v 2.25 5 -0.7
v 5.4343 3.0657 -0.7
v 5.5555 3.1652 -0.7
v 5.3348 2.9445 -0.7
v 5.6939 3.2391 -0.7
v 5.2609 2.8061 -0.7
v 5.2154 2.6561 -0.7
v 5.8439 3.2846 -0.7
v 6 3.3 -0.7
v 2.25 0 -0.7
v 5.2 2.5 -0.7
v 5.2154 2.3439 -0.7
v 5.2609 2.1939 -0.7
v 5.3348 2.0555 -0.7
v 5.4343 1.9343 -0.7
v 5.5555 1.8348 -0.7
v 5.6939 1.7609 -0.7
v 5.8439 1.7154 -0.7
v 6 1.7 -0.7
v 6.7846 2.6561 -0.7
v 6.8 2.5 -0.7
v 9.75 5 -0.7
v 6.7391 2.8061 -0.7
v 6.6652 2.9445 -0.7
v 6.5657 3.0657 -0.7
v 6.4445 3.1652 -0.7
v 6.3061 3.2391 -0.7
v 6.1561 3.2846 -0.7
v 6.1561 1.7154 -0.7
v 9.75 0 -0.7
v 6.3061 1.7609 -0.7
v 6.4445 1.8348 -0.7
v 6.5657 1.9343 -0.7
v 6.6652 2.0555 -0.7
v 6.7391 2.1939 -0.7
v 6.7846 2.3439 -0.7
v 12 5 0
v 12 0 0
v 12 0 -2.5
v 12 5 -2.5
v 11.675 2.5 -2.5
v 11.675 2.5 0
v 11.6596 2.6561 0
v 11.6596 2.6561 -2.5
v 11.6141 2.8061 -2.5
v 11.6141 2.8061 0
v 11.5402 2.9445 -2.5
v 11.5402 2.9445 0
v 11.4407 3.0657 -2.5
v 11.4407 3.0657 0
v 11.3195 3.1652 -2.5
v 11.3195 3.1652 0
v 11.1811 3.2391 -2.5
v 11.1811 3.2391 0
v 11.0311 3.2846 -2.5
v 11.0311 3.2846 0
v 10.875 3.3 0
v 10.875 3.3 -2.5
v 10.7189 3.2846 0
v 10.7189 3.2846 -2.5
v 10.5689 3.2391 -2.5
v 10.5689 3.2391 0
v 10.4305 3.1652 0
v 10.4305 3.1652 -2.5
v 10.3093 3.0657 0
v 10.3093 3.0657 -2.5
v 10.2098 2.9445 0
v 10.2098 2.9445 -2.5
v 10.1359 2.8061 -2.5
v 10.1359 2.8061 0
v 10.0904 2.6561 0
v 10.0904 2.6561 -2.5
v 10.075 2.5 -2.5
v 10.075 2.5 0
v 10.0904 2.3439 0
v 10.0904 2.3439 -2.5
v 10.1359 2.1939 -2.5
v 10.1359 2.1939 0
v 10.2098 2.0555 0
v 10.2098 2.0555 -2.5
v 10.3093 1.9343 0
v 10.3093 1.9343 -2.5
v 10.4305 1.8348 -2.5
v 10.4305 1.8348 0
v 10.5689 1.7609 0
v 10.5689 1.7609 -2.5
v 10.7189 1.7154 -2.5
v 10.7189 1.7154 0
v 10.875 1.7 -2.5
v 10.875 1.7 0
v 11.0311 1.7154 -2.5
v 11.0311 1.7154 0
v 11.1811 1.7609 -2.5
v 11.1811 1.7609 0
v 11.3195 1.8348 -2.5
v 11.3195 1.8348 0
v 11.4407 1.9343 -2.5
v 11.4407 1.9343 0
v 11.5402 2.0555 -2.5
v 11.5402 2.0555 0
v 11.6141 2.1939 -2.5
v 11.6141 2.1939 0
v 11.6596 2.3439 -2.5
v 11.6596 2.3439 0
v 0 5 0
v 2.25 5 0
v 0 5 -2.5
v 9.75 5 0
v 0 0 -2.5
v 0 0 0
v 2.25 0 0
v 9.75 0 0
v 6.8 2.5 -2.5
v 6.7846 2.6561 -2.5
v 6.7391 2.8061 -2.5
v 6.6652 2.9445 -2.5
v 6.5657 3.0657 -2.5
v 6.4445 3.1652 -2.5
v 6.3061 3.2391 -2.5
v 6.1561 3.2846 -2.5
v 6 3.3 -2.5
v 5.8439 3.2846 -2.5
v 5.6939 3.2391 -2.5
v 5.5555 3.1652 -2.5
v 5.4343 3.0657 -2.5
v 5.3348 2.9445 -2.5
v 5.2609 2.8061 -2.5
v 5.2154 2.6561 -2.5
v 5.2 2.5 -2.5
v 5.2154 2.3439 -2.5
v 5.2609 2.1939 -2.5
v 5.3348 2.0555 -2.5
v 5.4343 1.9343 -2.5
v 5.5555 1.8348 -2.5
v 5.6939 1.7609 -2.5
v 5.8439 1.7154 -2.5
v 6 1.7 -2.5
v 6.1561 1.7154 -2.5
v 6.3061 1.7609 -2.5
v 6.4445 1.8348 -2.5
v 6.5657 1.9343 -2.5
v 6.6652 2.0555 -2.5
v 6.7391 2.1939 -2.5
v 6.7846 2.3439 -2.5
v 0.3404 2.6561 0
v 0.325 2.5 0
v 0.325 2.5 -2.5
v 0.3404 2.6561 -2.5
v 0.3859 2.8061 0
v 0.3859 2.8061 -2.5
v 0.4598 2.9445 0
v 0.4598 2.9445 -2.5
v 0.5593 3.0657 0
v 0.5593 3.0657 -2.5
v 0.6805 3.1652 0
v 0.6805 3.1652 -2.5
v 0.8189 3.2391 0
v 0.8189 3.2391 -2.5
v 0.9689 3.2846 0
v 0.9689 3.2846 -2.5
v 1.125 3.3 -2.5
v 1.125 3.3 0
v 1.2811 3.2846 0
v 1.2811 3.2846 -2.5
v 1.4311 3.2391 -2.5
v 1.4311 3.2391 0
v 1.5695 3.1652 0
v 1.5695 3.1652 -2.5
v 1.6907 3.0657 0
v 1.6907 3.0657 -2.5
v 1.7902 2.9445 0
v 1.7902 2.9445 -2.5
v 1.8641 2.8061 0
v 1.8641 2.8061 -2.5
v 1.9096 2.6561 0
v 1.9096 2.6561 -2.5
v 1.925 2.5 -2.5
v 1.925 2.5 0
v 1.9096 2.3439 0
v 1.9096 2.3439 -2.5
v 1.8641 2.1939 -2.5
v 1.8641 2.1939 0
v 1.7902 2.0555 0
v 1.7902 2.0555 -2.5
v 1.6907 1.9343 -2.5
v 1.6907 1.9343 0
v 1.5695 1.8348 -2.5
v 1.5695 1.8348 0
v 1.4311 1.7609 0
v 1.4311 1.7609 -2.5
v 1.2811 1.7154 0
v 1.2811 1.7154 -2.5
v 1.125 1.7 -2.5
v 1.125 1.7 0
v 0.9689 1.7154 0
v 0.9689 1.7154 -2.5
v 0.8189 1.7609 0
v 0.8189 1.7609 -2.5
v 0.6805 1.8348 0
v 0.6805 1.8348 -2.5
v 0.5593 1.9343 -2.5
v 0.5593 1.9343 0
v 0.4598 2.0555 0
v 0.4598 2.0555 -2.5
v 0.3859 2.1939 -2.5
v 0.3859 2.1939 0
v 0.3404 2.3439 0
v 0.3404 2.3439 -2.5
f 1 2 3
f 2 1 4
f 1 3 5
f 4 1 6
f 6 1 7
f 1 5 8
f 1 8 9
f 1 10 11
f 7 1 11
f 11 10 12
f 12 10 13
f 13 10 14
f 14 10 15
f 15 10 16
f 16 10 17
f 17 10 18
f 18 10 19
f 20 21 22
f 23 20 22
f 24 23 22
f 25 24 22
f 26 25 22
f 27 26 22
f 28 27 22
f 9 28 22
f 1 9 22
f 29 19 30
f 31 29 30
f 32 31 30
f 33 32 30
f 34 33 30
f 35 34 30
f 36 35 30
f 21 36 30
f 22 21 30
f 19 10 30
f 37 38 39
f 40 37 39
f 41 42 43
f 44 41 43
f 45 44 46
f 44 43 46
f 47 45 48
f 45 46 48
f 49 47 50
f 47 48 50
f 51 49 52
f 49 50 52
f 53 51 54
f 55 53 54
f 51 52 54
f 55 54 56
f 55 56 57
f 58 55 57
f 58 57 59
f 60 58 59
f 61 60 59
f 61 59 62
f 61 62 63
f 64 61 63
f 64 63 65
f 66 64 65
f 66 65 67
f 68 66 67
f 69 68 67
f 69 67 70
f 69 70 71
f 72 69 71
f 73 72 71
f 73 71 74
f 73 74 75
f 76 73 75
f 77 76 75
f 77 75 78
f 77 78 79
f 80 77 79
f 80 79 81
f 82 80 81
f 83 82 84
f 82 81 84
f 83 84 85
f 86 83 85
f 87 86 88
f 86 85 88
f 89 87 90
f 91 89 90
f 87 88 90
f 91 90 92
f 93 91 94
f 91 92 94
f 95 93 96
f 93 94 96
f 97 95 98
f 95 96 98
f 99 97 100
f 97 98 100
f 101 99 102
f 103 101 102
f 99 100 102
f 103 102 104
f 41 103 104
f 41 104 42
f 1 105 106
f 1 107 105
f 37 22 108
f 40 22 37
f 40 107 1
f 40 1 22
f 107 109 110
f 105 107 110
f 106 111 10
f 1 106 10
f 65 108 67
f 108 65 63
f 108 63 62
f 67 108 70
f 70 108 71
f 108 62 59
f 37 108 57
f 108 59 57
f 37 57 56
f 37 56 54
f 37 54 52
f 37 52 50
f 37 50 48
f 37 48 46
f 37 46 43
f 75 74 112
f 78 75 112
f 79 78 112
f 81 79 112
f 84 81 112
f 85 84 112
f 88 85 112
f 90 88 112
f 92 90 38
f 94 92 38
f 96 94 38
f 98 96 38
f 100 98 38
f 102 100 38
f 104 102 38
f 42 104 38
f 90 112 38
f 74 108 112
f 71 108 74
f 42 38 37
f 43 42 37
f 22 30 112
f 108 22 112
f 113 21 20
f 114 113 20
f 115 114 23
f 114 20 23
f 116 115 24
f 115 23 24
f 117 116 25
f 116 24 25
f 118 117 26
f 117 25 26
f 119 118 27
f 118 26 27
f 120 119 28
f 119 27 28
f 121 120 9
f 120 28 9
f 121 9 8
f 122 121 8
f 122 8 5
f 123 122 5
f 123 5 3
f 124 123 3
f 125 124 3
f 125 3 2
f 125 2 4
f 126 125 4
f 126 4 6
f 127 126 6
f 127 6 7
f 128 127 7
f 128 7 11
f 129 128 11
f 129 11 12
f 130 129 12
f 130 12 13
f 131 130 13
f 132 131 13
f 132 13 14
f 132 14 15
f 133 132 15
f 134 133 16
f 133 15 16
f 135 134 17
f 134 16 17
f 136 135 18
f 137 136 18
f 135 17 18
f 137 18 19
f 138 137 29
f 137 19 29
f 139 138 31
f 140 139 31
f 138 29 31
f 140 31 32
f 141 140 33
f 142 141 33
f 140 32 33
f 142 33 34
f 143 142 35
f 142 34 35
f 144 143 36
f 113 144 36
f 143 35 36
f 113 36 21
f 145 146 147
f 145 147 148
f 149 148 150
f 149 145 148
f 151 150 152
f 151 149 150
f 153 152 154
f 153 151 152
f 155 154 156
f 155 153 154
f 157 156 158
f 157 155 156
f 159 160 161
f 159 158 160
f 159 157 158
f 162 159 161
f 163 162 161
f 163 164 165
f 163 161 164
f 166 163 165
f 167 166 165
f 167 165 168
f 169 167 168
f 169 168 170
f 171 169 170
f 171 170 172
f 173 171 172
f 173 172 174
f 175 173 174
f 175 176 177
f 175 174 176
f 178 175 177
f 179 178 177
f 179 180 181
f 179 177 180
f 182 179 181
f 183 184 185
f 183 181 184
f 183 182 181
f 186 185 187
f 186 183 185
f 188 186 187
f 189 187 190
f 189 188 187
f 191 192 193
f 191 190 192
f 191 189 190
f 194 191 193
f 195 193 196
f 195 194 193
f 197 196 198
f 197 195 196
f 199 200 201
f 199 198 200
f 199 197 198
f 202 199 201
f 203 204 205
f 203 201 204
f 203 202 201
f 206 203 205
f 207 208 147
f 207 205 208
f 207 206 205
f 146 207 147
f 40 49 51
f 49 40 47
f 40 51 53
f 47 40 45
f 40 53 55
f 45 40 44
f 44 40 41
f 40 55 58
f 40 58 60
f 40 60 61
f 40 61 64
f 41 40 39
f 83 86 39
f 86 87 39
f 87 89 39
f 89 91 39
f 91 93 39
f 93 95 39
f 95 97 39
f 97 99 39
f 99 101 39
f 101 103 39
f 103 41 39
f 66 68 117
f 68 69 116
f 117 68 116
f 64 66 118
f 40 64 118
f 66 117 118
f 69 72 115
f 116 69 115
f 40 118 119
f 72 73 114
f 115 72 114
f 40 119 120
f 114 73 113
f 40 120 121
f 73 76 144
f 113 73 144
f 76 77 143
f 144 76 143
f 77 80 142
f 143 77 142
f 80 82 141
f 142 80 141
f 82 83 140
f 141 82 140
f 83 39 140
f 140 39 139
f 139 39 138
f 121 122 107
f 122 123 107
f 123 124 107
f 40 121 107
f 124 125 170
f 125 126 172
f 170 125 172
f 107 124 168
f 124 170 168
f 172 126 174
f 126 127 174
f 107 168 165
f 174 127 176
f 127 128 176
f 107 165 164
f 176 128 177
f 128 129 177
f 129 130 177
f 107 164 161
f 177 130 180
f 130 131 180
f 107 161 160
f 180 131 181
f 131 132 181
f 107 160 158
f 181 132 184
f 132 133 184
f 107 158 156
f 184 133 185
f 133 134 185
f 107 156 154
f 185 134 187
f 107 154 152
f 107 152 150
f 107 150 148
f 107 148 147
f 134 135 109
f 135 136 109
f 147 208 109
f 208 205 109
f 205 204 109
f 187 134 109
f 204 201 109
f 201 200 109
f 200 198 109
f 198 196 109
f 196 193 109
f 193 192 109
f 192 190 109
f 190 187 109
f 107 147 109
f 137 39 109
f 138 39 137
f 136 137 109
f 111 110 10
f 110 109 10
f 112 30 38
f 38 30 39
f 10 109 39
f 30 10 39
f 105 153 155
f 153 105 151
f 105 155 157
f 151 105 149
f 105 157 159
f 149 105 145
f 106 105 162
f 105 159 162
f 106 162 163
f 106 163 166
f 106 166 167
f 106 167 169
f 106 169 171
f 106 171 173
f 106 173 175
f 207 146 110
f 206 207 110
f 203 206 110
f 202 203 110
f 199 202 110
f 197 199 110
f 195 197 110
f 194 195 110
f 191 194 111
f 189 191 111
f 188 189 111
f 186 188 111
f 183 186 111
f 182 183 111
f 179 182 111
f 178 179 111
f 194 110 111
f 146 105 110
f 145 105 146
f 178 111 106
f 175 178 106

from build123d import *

# Parameters (mm, degrees)
BOSS_EXTRUDE1_DEPTH              = 5
F_97_0_0059_DIAMETER_HOLE1_D     = 1.600000102
F_97_0_0059_DIAMETER_HOLE1_DEPTH = 3
M2X0_4_TAPPED_HOLE1_D            = 1.6
M2X0_4_TAPPED_HOLE1_DEPTH        = 5.2
M2X0_4_TAPPED_HOLE1_TIP          = 0.480688495


with BuildPart() as part:
    # Sketch1 → Boss-Extrude1 (new body)
    with BuildSketch(Plane(origin=(0, 0, 0), x_dir=(1, 0, 0), z_dir=(0, 1, 0))):
        Polygon((0, 0), (2.25, 0), (2.25, 0.7), (9.75, 0.7), (9.75, 0), (12, 0), (12, 2.5), (0, 2.5), align=None)
    extrude(amount=BOSS_EXTRUDE1_DEPTH)

    # #97 (0.0059) Diameter Hole1
    with Locations(Plane(origin=(0, 0, -2.5), x_dir=(-1, 0, 0), z_dir=(0, 0, -1))):
        with Locations((-10.875, 2.5)):
            f_97_0_0059_diameter_hole1 = Hole(F_97_0_0059_DIAMETER_HOLE1_D / 2, depth=F_97_0_0059_DIAMETER_HOLE1_DEPTH)

    # M2x0.4 Tapped Hole1
    with Locations(Plane(origin=(0, 0, -2.5), x_dir=(-1, 0, 0), z_dir=(0, 0, -1))):
        with Locations((-6, 2.5)):
            Hole(M2X0_4_TAPPED_HOLE1_D / 2, depth=M2X0_4_TAPPED_HOLE1_DEPTH)
            with Locations((0, 0, -(M2X0_4_TAPPED_HOLE1_DEPTH + M2X0_4_TAPPED_HOLE1_TIP / 2))):  # 118° drill point
                Cone(0, M2X0_4_TAPPED_HOLE1_D / 2, M2X0_4_TAPPED_HOLE1_TIP, mode=Mode.SUBTRACT)

    # Mirror1: #97 (0.0059) Diameter Hole1 across plane
    add(f_97_0_0059_diameter_hole1.mirror(Plane(origin=(6, 0, 0), x_dir=(0, 0, 1), z_dir=(1, 0, 0))), mode=Mode.SUBTRACT)


solid = part.part
